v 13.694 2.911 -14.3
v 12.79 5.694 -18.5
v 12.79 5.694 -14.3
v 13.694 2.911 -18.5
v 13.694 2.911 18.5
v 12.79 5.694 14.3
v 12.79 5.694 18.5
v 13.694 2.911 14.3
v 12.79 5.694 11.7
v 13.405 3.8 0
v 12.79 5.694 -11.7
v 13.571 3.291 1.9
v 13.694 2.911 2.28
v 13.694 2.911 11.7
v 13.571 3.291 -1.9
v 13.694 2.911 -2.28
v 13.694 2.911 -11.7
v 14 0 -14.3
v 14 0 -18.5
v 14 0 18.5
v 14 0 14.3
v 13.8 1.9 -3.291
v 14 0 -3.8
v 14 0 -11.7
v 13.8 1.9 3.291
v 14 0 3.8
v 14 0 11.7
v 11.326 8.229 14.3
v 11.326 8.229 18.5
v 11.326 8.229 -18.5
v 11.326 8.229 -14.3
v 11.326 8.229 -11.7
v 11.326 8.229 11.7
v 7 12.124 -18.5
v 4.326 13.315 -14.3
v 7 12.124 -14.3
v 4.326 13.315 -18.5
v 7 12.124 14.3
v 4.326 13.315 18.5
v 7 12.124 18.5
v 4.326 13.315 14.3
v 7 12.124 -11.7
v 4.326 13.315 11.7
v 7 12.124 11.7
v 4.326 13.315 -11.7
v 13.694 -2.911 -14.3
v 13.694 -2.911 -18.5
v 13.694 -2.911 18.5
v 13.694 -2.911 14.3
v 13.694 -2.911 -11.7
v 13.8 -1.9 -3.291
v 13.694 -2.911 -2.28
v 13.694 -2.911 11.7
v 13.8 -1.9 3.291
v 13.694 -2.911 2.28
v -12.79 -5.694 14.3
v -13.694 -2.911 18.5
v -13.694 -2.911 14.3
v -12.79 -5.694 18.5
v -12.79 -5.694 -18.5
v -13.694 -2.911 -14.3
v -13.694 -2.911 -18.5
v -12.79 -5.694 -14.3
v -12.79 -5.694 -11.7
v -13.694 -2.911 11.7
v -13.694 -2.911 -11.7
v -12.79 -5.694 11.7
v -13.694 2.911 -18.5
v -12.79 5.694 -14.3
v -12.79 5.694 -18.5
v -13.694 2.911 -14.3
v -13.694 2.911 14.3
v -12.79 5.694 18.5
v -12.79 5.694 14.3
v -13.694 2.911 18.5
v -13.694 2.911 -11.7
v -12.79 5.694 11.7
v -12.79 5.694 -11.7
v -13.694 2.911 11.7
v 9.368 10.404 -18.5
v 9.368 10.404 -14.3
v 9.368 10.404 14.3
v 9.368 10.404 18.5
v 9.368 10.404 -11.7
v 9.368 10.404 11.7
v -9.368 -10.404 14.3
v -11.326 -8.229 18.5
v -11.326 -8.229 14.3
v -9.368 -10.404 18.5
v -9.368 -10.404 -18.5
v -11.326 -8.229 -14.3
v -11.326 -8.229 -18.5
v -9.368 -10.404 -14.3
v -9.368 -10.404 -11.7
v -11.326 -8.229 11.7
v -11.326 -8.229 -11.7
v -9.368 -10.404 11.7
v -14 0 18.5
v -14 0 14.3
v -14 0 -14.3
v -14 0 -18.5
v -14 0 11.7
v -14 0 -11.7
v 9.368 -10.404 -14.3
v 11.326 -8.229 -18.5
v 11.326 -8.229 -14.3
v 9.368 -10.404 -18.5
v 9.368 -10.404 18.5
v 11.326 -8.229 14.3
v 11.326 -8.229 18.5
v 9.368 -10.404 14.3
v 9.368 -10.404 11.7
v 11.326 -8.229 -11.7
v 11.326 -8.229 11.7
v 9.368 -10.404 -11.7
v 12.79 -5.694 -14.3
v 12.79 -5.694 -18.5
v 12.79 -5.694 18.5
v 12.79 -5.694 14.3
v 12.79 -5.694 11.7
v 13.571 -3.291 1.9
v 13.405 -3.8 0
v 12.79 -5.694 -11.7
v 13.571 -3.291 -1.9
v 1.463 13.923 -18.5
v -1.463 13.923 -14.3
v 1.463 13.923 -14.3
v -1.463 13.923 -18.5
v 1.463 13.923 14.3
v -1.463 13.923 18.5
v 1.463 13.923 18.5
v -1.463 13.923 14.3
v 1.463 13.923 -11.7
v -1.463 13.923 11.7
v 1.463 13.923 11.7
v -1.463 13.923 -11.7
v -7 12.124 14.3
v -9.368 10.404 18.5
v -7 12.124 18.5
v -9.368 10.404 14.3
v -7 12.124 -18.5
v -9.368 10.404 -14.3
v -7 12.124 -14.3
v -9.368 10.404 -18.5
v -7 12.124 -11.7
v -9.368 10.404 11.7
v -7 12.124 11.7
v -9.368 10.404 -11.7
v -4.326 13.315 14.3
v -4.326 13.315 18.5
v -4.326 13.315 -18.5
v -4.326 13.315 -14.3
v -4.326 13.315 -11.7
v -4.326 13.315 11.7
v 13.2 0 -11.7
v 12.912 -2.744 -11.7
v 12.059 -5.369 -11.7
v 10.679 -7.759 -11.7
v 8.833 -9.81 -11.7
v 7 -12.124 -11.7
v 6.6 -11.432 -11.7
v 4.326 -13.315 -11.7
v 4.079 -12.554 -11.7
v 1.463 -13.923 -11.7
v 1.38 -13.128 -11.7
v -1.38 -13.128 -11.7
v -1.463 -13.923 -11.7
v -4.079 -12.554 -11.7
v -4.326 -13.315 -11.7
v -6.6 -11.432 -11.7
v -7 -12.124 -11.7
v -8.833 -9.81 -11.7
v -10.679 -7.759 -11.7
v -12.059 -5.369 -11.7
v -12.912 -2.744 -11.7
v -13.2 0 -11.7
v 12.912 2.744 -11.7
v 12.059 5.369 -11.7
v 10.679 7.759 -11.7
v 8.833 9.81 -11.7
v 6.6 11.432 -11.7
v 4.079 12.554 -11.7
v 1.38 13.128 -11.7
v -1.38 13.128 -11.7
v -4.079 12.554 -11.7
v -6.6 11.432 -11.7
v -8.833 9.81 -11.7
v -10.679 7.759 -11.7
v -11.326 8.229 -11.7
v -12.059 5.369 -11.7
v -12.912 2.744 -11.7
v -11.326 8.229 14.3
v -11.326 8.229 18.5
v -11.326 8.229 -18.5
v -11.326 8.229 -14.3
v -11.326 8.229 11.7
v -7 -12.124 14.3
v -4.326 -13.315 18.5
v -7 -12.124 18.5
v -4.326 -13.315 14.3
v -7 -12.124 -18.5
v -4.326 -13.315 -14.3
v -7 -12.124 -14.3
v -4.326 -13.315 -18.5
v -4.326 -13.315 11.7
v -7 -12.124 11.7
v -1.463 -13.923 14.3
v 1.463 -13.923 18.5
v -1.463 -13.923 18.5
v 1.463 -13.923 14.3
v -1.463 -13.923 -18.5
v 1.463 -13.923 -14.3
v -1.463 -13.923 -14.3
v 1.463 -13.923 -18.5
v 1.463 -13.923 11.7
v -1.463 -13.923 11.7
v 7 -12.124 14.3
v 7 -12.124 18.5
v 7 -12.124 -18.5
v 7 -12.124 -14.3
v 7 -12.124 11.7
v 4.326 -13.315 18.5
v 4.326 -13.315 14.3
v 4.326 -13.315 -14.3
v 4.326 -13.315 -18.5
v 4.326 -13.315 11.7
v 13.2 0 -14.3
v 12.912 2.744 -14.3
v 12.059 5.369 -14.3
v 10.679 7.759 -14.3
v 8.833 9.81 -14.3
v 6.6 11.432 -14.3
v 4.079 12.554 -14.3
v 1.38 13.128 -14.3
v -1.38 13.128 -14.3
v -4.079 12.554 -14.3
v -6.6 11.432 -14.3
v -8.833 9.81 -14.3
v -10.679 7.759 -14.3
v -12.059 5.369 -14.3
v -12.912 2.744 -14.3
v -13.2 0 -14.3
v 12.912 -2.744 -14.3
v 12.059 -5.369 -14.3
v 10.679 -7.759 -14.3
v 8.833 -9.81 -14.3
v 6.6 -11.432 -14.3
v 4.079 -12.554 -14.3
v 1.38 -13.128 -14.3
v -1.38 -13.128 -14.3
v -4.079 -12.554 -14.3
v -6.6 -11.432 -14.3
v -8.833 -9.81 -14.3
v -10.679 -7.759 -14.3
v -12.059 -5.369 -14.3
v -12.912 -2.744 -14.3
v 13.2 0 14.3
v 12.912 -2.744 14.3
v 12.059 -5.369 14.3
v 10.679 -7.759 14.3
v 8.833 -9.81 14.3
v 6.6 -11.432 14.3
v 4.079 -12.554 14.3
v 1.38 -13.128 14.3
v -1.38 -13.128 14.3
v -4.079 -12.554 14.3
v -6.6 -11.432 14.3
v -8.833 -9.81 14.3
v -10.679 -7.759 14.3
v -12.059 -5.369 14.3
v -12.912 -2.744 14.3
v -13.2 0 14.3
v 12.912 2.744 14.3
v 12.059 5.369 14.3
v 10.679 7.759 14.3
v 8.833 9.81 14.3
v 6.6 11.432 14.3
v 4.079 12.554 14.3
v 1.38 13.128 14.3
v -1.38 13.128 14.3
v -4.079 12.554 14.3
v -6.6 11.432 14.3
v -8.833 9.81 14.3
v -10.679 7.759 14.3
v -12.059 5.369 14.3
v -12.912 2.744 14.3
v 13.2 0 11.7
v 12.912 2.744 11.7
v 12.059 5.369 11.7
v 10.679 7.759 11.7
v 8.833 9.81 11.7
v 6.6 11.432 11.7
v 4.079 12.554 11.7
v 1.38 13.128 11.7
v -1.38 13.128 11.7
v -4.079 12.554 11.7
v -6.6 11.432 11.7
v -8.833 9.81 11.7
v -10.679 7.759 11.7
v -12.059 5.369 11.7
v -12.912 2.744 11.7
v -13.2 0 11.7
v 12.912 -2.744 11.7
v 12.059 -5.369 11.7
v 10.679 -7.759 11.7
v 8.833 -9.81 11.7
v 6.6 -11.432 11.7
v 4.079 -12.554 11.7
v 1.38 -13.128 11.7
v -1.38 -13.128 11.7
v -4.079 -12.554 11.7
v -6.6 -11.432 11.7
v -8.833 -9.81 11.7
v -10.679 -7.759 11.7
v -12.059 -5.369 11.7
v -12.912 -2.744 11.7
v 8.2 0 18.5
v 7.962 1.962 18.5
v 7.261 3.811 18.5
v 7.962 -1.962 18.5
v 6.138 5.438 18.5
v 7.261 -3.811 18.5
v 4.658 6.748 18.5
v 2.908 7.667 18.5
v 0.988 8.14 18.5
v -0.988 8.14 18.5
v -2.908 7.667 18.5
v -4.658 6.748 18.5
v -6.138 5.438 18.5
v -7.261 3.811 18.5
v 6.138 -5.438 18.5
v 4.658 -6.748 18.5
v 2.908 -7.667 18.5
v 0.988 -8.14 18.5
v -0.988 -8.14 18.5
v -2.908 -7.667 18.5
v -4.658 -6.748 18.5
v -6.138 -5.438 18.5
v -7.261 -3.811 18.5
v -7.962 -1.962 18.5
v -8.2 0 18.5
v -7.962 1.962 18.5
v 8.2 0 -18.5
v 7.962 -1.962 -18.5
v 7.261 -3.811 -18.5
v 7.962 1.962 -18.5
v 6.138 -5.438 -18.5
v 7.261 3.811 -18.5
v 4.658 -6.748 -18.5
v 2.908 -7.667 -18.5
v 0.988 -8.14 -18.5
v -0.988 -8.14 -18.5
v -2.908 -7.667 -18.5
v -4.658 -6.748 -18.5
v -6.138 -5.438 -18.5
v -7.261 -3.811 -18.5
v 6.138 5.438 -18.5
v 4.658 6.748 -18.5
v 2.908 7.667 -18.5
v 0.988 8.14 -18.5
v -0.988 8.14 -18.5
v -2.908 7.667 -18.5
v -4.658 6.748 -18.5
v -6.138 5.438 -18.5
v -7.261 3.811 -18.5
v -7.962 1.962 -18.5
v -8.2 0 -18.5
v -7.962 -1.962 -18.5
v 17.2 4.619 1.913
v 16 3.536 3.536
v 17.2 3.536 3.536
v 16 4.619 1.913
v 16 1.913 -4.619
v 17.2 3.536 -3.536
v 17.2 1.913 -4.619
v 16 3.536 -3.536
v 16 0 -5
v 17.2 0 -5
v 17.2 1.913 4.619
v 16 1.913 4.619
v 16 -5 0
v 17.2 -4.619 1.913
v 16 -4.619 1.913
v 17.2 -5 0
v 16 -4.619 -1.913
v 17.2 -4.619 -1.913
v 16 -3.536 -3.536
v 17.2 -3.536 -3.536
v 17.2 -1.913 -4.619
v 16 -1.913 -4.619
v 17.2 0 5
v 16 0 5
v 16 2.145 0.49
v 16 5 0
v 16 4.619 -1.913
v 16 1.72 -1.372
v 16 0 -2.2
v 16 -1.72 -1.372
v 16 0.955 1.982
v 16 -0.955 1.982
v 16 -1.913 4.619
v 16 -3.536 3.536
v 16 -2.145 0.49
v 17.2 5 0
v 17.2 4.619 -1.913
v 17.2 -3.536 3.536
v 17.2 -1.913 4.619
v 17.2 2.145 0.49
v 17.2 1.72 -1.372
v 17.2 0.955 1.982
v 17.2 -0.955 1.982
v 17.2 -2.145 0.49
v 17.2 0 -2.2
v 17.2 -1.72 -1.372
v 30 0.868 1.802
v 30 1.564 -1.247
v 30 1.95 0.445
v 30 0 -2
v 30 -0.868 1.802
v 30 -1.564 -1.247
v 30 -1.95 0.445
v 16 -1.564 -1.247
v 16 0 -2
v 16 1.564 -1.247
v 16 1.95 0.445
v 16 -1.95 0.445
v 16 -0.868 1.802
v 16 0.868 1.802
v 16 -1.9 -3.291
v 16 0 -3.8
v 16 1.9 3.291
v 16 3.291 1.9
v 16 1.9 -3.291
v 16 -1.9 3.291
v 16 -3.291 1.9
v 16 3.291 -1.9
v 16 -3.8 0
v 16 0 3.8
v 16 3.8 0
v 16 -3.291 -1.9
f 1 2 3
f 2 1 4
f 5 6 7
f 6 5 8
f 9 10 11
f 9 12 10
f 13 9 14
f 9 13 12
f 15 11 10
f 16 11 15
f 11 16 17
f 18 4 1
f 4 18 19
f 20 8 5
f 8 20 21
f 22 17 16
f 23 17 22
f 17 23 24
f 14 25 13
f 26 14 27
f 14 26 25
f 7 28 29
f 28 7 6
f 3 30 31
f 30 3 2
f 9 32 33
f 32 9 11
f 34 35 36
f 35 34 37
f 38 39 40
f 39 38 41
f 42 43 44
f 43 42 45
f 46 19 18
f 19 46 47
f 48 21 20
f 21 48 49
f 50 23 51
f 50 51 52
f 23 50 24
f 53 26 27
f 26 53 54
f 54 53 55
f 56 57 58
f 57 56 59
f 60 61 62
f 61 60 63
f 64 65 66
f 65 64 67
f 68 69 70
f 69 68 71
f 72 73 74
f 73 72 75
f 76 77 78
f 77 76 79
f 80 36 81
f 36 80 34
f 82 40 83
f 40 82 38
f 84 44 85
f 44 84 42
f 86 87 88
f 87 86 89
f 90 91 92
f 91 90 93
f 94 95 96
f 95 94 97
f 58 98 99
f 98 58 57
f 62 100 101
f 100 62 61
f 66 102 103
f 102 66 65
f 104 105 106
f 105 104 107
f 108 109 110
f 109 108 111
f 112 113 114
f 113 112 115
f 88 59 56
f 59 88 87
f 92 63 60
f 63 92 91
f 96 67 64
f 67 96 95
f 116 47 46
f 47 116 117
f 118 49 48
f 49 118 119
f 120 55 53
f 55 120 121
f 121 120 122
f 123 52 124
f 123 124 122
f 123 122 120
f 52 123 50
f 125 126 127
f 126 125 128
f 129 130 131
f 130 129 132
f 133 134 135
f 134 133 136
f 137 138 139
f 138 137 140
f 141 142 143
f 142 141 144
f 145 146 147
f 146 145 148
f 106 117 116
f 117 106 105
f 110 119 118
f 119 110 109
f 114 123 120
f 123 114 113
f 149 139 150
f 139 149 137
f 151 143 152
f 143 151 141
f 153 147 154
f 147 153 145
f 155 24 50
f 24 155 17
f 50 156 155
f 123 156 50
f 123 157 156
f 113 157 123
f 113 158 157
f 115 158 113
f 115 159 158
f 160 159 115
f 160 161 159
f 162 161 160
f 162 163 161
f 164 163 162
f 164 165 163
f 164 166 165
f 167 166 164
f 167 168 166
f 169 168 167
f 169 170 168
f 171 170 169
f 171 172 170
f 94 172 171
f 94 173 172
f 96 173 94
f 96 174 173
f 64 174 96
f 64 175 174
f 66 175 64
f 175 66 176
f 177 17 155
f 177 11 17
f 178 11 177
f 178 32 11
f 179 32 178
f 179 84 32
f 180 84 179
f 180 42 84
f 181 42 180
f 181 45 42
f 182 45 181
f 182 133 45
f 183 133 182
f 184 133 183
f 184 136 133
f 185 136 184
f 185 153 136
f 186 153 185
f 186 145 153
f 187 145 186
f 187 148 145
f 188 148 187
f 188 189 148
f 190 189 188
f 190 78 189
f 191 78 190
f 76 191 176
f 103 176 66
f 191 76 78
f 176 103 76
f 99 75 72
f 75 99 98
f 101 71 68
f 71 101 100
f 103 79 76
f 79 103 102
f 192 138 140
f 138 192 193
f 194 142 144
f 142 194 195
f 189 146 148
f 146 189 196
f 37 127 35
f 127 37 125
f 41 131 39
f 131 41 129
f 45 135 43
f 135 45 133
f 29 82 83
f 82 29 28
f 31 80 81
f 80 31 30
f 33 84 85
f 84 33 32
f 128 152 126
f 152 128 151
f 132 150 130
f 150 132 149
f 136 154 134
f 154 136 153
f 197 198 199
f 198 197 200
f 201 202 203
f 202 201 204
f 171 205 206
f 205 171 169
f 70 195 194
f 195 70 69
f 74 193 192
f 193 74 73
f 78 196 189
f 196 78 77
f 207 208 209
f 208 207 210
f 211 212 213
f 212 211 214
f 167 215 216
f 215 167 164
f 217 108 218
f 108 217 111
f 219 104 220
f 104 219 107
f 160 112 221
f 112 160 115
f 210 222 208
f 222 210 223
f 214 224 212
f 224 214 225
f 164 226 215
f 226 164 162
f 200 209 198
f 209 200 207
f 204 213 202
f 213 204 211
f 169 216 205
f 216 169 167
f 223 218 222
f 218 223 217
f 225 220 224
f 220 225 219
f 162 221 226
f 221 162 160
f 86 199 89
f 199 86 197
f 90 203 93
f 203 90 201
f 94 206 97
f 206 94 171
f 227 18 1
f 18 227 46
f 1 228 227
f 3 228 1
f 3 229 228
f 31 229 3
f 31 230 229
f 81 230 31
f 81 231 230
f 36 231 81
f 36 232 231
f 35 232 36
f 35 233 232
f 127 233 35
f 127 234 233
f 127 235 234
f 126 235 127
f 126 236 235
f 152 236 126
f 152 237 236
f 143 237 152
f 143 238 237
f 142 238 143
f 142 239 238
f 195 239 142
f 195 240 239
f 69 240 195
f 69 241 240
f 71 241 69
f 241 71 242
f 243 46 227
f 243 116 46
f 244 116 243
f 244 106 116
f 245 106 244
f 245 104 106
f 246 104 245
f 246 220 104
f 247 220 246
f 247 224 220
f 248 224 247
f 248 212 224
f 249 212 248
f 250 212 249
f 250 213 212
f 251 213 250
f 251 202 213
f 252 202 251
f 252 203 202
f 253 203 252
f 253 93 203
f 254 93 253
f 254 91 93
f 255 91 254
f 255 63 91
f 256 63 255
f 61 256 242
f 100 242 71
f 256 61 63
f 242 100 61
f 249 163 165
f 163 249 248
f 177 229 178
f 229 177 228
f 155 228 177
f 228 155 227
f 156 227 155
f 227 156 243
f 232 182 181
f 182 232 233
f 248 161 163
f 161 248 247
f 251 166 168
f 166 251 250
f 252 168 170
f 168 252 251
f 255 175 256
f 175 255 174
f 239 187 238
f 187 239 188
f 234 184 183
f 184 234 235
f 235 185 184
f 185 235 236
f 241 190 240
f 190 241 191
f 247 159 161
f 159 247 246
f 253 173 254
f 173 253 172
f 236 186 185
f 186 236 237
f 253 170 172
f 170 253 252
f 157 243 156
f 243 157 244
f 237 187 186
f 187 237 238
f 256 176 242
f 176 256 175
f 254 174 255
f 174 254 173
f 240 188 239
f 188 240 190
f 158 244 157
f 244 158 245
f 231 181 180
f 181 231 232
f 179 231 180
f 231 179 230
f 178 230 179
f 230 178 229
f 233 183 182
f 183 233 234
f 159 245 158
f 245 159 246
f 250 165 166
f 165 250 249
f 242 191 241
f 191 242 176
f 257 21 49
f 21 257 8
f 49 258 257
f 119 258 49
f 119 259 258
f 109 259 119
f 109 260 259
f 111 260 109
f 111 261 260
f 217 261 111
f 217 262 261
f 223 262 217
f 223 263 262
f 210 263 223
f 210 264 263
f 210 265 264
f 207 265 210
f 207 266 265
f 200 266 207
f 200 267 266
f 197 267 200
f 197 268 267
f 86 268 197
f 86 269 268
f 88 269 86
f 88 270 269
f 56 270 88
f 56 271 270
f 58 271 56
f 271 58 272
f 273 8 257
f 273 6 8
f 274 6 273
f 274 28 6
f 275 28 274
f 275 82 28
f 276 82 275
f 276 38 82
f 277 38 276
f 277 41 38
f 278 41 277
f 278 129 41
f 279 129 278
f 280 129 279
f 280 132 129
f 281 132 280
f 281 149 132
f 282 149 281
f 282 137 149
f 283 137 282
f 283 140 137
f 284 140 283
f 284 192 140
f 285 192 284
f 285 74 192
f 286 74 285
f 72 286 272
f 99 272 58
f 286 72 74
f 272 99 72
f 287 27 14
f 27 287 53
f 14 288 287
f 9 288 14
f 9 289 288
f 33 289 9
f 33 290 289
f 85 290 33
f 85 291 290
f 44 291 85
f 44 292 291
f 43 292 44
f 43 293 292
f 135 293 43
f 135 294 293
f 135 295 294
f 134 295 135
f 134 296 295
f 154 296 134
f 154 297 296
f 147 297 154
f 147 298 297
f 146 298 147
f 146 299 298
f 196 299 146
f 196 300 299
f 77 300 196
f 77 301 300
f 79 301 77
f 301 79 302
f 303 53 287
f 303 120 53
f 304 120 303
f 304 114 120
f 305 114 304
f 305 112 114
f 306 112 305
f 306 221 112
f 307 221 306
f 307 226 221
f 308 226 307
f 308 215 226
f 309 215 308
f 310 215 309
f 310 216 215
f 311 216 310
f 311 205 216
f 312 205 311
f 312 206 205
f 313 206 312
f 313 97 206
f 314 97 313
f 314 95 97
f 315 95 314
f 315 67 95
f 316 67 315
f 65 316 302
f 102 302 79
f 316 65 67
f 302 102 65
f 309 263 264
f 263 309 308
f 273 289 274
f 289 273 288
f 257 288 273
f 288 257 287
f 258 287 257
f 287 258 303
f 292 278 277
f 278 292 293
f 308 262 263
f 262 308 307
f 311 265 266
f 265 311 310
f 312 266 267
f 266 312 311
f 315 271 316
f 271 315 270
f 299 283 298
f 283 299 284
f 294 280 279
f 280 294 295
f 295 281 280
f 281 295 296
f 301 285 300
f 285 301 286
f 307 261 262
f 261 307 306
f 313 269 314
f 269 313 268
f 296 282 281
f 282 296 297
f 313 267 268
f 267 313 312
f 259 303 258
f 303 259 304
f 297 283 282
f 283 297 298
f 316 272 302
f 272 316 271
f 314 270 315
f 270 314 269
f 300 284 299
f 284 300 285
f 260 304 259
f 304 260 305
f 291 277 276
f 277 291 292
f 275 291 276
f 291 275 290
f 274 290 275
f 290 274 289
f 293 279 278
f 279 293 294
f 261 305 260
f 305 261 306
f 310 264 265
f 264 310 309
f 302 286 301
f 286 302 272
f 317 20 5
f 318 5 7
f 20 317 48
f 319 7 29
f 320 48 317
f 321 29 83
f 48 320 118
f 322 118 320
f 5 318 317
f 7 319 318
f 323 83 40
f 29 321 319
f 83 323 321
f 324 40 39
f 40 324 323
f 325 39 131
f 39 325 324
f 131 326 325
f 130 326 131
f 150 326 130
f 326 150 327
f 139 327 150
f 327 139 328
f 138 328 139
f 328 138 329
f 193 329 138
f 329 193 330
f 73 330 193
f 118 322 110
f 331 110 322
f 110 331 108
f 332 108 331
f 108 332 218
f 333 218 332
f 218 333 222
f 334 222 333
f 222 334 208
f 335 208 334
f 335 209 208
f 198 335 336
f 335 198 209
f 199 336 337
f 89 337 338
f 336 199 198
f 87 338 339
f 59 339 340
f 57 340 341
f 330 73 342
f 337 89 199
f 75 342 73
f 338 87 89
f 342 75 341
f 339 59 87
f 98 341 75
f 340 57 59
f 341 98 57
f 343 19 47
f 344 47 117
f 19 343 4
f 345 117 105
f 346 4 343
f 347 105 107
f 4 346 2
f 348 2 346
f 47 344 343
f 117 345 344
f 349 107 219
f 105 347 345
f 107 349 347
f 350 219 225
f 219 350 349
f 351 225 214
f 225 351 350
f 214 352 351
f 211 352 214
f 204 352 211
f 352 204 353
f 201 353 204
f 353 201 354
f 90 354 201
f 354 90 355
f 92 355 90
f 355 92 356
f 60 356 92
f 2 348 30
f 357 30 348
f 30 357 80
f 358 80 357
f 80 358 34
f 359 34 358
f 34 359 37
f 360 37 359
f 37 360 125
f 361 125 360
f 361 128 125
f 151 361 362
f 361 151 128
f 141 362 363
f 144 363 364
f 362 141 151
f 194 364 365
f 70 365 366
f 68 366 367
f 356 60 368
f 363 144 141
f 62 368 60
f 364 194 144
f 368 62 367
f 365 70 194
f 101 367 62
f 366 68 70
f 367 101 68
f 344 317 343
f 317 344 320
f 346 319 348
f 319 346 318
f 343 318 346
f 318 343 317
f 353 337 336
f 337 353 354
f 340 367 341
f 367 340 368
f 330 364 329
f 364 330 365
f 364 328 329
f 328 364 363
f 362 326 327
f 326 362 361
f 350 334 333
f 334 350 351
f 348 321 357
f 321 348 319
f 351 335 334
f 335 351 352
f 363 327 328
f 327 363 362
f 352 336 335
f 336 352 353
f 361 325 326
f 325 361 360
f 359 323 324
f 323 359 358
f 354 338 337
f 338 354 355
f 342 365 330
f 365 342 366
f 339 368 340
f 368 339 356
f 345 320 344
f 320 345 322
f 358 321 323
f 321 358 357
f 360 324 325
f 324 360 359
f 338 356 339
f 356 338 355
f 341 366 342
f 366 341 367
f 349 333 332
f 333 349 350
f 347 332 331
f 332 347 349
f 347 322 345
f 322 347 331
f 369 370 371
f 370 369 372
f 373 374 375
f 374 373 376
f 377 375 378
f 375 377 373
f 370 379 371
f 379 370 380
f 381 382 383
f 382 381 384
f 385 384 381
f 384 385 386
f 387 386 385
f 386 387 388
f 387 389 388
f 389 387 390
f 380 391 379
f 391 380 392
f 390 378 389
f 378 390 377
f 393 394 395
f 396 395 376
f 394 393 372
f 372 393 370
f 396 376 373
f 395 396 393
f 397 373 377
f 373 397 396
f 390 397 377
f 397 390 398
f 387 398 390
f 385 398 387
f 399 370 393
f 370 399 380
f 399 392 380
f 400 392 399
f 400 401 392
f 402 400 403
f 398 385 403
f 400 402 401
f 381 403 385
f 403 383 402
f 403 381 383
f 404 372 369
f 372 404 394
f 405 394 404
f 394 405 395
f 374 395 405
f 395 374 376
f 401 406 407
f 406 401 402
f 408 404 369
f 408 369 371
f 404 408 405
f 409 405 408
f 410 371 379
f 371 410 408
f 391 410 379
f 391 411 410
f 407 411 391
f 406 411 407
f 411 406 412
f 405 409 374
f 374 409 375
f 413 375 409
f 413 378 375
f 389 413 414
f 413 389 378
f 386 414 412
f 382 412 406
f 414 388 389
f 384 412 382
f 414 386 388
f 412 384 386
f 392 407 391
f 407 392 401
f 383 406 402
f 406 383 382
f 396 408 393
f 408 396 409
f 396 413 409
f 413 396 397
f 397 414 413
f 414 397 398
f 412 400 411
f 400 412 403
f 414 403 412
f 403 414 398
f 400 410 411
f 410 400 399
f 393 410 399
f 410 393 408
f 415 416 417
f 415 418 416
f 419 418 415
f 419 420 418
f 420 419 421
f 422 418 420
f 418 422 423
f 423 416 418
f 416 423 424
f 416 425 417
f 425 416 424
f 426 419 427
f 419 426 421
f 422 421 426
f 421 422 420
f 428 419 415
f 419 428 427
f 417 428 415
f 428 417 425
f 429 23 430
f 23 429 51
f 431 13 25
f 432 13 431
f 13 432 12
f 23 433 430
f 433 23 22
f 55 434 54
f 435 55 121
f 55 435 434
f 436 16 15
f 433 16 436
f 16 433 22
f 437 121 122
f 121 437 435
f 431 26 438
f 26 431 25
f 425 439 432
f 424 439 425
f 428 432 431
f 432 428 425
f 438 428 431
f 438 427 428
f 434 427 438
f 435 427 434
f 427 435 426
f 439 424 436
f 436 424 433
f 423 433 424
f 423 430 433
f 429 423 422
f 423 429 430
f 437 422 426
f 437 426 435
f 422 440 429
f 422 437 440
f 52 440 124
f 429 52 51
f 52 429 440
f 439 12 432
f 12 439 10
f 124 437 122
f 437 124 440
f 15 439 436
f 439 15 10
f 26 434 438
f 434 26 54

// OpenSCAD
// Parameters
bore_diameter_mm = 16; //[8:32:0.1]
outer_diameter_mm = 28; //[14:56:0.1]
length_mm = 37; //[18.5:74:0.1]
bore_radius_mm = 8; //[4:16:0.1]
outer_radius_mm = 14; //[7:28:0.1]
wall_thickness_mm = 6; //[3:12:0.1]
casing_inner_radius_mm = 8; //[6:13:0.1]
eps_mm = 0.2; //[0.05:0.5:0.05]
overlap_mm = 1; //[0.5:2:0.1]
groove_count = 2; //[0:2:1]
groove_width_mm = 2.2; //[1:4.5:0.1]
groove_depth_mm = 0.8; //[0.3:2:0.1]
groove_spacing_mm = 26; //[10:60:0.1]
seal_length_mm = 3; //[1.5:6:0.1]
seal_outer_radius_mm = 12.5; //[9:13.8:0.1]
seal_inner_radius_mm = 8.2; //[7.5:9:0.1]
open_bearing_enabled = 0; //[0:1:1]
open_slot_width_mm = 10; //[6:16:0.1]
open_slot_depth_mm = 20; //[10:40:0.1]
screw_shank_radius_mm = 2; //[1:4:0.1]
screw_length_mm = 20; //[10:40:0.5]
screw_head_radius_mm = 3.8; //[2.5:6:0.1]
screw_head_height_mm = 3; //[1.5:6:0.1]
washer_outer_radius_mm = 5; //[3.5:9:0.1]
washer_thickness_mm = 1.2; //[0.6:3:0.1]
washer_hole_radius_mm = 2.2; //[1.2:4.5:0.1]

// Linear Bearing - complete geometry
module linear_bearing() {
  color([0.85, 0.85, 0.8]) {
    // Bearing casing with grooves
    difference() {
      cylinder(r=outer_radius_mm, h=length_mm, center=true);
      cylinder(r=bore_radius_mm + eps_mm, h=length_mm + 2*eps_mm, center=true);
      if (groove_count > 0) {
        for (i = [-1, 1]) {
          translate([0, 0, i * groove_spacing_mm / 2])
            difference() {
              cylinder(r=outer_radius_mm, h=groove_width_mm + 2*eps_mm, center=true);
              cylinder(r=outer_radius_mm - groove_depth_mm, h=groove_width_mm + 4*eps_mm, center=true);
            }
        }
      }
      if (open_bearing_enabled) {
        translate([outer_radius_mm - open_slot_depth_mm/2 + overlap_mm, 0, 0])
          rotate([0, 90, 0])
          cube([open_slot_depth_mm, open_slot_width_mm, length_mm + 2*eps_mm], center=true);
      }
    }
    // End seal rings
    union() {
      for (i = [-1, 1]) {
        translate([0, 0, i * (length_mm/2 - seal_length_mm/2)])
          difference() {
            cylinder(r=seal_outer_radius_mm, h=seal_length_mm, center=true);
            cylinder(r=seal_inner_radius_mm, h=seal_length_mm + 2*eps_mm, center=true);
          }
      }
    }
  }
}

// Screw and Washer - complete geometry
module screw_and_washer() {
  color("Silver") {
    // Screw shank
    translate([outer_radius_mm + screw_head_radius_mm + washer_thickness_mm + overlap_mm, 0, 0])
      rotate([0, 90, 0])
      cylinder(r=screw_shank_radius_mm, h=screw_length_mm, center=true);
    // Screw head
    translate([outer_radius_mm + screw_head_height_mm/2 - overlap_mm, 0, 0])
      rotate([0, 90, 0])
      cylinder(r=screw_head_radius_mm, h=screw_head_height_mm, center=true);
    // Washer
    translate([outer_radius_mm + screw_head_height_mm + washer_thickness_mm/2 - overlap_mm, 0, 0])
      rotate([0, 90, 0])
      difference() {
        cylinder(r=washer_outer_radius_mm, h=washer_thickness_mm, center=true);
        cylinder(r=washer_hole_radius_mm, h=washer_thickness_mm + 2*eps_mm, center=true);
      }
  }
}

// Assembly
module assembly() {
  linear_bearing();
  screw_and_washer();
}

assembly();
